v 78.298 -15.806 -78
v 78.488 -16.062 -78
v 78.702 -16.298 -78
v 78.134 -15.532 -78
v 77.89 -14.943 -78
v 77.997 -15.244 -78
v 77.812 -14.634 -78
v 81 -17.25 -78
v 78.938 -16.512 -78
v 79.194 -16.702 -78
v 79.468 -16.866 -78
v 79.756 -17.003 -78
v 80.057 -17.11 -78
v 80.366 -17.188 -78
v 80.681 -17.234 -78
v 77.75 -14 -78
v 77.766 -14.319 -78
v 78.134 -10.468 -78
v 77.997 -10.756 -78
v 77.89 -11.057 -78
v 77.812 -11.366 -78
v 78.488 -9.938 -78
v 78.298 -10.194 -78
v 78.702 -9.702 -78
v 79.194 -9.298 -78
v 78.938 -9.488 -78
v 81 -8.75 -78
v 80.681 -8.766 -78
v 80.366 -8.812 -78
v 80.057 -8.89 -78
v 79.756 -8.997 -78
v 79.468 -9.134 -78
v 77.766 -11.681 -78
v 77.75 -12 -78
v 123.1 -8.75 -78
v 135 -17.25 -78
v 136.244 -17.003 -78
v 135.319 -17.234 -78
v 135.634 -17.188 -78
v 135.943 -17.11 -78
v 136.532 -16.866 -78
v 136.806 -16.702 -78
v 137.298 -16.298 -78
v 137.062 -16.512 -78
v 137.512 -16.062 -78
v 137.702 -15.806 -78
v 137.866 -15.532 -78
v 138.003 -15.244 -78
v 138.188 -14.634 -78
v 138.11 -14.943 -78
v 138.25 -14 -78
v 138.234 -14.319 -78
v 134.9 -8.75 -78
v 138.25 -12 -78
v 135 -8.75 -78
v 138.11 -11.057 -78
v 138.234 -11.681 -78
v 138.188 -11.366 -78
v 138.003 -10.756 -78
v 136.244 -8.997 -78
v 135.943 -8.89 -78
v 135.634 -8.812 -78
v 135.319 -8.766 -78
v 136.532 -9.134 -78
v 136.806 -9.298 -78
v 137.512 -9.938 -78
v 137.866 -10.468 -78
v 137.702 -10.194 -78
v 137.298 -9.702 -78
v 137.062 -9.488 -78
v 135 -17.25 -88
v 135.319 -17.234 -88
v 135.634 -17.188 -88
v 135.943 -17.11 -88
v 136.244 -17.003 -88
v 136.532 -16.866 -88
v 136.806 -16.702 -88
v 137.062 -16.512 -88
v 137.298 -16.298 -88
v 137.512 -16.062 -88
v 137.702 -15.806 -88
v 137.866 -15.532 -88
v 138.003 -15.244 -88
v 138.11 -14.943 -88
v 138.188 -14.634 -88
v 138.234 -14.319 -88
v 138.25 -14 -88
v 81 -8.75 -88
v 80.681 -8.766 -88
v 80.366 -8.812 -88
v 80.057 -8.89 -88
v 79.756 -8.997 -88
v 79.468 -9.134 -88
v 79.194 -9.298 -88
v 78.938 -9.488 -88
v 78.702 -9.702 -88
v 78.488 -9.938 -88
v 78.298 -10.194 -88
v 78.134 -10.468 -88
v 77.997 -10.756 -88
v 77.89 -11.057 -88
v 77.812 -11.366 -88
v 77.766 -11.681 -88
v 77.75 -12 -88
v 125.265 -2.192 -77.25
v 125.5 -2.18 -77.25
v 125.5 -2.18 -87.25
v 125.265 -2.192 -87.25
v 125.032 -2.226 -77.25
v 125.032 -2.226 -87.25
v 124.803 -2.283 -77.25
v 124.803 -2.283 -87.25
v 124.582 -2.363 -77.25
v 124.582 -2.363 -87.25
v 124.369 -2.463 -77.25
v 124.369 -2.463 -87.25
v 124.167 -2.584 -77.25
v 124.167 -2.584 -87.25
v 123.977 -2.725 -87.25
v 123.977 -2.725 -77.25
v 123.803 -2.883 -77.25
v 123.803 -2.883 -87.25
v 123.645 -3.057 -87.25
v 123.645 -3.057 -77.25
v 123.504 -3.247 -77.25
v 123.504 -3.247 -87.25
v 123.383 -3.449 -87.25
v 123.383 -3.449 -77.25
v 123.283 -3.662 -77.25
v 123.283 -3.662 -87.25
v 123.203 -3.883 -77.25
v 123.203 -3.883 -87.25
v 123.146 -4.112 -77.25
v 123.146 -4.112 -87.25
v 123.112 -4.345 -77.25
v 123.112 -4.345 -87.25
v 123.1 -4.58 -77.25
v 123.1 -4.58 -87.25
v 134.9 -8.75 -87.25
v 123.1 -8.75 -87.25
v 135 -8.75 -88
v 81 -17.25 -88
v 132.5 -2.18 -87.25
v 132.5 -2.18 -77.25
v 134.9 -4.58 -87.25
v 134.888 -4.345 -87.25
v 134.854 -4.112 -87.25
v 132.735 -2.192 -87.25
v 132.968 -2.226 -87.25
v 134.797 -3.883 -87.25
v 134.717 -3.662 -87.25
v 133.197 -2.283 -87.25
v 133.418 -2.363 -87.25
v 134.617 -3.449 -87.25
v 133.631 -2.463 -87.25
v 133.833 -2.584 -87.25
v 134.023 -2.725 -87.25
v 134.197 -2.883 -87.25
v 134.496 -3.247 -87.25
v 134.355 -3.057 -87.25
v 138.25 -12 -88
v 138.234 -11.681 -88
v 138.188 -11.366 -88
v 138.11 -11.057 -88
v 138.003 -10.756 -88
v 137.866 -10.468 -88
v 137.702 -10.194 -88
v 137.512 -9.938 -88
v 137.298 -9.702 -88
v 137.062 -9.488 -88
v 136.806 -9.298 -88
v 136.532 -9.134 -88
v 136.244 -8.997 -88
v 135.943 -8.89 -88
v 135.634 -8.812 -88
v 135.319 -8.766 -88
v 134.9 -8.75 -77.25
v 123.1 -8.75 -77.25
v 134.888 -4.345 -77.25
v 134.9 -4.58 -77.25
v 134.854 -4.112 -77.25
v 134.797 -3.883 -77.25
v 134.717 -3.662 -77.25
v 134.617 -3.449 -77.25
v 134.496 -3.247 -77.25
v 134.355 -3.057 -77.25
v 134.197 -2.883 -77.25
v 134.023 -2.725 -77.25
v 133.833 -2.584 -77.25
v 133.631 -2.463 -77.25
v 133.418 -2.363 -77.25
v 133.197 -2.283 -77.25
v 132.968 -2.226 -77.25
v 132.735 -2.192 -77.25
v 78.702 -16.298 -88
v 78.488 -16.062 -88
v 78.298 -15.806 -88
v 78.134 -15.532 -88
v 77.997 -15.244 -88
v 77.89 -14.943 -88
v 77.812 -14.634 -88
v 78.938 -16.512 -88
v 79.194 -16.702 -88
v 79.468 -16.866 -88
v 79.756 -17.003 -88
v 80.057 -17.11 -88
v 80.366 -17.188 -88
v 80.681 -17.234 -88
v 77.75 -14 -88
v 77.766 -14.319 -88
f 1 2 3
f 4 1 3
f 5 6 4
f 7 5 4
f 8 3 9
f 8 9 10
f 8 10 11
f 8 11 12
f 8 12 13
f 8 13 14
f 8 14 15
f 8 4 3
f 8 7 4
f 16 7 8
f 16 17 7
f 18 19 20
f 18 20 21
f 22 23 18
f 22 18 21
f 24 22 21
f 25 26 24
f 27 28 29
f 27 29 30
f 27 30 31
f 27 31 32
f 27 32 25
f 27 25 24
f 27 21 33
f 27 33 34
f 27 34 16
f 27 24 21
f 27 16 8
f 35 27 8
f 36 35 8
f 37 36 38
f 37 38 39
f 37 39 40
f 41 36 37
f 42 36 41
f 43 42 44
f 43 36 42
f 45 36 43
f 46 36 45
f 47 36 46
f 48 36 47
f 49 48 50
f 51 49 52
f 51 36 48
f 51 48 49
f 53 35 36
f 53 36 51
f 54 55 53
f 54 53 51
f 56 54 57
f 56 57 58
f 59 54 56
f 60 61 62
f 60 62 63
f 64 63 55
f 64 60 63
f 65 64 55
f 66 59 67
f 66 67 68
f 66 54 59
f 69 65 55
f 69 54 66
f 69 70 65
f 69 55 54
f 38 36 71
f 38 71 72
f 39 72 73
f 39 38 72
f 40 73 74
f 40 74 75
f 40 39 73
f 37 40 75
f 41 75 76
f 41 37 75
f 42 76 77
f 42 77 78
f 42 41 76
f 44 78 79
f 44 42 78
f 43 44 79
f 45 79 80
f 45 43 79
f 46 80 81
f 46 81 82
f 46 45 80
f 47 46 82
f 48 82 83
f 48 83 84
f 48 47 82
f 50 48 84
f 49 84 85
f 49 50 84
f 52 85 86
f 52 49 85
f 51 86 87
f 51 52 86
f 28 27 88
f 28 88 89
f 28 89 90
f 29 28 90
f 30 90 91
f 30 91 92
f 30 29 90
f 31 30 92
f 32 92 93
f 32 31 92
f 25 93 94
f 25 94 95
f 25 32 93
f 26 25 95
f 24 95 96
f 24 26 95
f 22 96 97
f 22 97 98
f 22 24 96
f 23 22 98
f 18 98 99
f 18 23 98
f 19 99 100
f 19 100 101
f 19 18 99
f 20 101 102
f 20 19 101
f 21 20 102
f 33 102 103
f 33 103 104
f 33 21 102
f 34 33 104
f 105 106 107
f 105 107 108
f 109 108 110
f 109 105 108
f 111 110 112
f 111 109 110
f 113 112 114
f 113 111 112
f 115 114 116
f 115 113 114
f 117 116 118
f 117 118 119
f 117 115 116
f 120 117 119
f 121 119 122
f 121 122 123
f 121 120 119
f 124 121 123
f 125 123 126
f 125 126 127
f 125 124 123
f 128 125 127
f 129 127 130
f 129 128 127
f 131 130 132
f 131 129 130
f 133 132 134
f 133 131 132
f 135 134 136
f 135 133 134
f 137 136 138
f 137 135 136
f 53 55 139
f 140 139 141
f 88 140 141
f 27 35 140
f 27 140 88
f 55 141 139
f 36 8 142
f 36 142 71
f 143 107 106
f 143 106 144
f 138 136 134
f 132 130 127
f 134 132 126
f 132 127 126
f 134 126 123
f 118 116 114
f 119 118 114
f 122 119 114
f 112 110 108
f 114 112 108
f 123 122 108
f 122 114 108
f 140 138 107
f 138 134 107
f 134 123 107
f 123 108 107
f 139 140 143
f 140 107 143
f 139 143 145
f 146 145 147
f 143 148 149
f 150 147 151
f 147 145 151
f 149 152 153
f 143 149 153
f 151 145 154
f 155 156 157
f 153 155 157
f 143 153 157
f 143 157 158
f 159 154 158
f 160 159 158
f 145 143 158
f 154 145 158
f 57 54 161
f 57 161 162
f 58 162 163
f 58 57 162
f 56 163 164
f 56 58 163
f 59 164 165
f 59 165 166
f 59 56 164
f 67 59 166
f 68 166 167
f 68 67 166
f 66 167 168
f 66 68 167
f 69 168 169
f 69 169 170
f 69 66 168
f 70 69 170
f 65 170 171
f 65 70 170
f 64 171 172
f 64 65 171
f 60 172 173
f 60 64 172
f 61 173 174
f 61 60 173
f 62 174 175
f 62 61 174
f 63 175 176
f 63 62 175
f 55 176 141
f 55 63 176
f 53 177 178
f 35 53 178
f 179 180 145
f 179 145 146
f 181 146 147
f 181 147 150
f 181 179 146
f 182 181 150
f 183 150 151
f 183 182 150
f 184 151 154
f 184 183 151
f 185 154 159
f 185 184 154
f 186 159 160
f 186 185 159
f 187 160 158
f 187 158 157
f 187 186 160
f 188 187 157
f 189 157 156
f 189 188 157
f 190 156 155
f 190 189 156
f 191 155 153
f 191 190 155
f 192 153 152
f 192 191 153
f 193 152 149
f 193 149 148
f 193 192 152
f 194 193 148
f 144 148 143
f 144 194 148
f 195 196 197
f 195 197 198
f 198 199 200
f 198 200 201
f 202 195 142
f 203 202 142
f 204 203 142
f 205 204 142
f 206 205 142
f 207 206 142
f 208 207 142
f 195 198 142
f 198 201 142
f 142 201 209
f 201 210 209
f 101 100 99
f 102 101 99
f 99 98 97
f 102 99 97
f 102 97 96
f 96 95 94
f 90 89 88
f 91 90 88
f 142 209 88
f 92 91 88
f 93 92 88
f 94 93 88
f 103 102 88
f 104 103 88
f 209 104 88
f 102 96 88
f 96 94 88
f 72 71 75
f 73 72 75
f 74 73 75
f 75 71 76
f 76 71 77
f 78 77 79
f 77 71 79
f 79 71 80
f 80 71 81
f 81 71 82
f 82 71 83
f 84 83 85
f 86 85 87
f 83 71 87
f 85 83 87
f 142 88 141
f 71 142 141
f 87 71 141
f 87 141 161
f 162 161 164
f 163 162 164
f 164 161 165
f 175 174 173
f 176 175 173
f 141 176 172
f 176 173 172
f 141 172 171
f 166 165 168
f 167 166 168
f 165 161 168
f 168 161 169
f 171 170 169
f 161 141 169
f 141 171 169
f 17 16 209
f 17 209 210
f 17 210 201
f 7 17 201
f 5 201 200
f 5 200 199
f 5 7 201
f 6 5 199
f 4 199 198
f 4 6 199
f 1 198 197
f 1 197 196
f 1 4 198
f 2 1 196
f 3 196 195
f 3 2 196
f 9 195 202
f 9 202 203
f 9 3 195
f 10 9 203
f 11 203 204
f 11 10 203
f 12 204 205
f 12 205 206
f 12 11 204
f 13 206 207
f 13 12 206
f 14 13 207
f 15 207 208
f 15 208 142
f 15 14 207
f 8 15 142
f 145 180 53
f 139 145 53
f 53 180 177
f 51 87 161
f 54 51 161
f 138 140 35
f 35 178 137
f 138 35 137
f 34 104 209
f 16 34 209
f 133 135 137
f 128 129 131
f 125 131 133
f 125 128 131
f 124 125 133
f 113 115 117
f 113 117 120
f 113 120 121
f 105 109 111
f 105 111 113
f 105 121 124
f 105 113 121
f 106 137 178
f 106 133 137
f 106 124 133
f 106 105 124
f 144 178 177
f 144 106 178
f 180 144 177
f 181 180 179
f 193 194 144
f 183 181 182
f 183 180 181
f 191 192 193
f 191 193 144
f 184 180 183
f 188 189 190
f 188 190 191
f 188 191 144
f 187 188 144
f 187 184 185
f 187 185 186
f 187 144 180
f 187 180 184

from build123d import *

# Parameters (mm, degrees)
EXTRUDE209_DEPTH = 10
EXTRUDE208_DEPTH = 10


with BuildPart() as microusbcut:
    # Sketch210 → Extrude209 (new body)
    with BuildSketch(Plane.XY.offset(-78)):
        with BuildLine():
            ThreePointArc((81, -8.75), (78.701903, -9.701903), (77.75, -12))
            Line((77.75, -12), (77.75, -14))
            ThreePointArc((77.75, -14), (78.701903, -16.298097), (81, -17.25))
            Line((81, -17.25), (135, -17.25))
            ThreePointArc((135, -17.25), (137.298097, -16.298097), (138.25, -14))
            Line((138.25, -14), (138.25, -12))
            ThreePointArc((138.25, -12), (137.298097, -9.701903), (135, -8.75))
            Line((135, -8.75), (81, -8.75))
        make_face()
    extrude(amount=-EXTRUDE209_DEPTH)


with BuildPart() as wirecuts:
    # Sketch209 → Extrude208 (new body)
    with BuildSketch(Plane.XY.offset(-77.25)):
        with BuildLine():
            ThreePointArc((125.5, -2.18), (123.802944, -2.882944), (123.1, -4.58))
            Line((123.1, -8.75), (123.1, -4.58))
            Line((134.9, -8.75), (123.1, -8.75))
            Line((134.9, -4.58), (134.9, -8.75))
            ThreePointArc((134.9, -4.58), (134.197056, -2.882944), (132.5, -2.18))
            Line((125.5, -2.18), (132.5, -2.18))
        make_face()
    extrude(amount=-EXTRUDE208_DEPTH)

    # Fusion202: union microUSBCut
    add(microusbcut.part)


solid = wirecuts.part
